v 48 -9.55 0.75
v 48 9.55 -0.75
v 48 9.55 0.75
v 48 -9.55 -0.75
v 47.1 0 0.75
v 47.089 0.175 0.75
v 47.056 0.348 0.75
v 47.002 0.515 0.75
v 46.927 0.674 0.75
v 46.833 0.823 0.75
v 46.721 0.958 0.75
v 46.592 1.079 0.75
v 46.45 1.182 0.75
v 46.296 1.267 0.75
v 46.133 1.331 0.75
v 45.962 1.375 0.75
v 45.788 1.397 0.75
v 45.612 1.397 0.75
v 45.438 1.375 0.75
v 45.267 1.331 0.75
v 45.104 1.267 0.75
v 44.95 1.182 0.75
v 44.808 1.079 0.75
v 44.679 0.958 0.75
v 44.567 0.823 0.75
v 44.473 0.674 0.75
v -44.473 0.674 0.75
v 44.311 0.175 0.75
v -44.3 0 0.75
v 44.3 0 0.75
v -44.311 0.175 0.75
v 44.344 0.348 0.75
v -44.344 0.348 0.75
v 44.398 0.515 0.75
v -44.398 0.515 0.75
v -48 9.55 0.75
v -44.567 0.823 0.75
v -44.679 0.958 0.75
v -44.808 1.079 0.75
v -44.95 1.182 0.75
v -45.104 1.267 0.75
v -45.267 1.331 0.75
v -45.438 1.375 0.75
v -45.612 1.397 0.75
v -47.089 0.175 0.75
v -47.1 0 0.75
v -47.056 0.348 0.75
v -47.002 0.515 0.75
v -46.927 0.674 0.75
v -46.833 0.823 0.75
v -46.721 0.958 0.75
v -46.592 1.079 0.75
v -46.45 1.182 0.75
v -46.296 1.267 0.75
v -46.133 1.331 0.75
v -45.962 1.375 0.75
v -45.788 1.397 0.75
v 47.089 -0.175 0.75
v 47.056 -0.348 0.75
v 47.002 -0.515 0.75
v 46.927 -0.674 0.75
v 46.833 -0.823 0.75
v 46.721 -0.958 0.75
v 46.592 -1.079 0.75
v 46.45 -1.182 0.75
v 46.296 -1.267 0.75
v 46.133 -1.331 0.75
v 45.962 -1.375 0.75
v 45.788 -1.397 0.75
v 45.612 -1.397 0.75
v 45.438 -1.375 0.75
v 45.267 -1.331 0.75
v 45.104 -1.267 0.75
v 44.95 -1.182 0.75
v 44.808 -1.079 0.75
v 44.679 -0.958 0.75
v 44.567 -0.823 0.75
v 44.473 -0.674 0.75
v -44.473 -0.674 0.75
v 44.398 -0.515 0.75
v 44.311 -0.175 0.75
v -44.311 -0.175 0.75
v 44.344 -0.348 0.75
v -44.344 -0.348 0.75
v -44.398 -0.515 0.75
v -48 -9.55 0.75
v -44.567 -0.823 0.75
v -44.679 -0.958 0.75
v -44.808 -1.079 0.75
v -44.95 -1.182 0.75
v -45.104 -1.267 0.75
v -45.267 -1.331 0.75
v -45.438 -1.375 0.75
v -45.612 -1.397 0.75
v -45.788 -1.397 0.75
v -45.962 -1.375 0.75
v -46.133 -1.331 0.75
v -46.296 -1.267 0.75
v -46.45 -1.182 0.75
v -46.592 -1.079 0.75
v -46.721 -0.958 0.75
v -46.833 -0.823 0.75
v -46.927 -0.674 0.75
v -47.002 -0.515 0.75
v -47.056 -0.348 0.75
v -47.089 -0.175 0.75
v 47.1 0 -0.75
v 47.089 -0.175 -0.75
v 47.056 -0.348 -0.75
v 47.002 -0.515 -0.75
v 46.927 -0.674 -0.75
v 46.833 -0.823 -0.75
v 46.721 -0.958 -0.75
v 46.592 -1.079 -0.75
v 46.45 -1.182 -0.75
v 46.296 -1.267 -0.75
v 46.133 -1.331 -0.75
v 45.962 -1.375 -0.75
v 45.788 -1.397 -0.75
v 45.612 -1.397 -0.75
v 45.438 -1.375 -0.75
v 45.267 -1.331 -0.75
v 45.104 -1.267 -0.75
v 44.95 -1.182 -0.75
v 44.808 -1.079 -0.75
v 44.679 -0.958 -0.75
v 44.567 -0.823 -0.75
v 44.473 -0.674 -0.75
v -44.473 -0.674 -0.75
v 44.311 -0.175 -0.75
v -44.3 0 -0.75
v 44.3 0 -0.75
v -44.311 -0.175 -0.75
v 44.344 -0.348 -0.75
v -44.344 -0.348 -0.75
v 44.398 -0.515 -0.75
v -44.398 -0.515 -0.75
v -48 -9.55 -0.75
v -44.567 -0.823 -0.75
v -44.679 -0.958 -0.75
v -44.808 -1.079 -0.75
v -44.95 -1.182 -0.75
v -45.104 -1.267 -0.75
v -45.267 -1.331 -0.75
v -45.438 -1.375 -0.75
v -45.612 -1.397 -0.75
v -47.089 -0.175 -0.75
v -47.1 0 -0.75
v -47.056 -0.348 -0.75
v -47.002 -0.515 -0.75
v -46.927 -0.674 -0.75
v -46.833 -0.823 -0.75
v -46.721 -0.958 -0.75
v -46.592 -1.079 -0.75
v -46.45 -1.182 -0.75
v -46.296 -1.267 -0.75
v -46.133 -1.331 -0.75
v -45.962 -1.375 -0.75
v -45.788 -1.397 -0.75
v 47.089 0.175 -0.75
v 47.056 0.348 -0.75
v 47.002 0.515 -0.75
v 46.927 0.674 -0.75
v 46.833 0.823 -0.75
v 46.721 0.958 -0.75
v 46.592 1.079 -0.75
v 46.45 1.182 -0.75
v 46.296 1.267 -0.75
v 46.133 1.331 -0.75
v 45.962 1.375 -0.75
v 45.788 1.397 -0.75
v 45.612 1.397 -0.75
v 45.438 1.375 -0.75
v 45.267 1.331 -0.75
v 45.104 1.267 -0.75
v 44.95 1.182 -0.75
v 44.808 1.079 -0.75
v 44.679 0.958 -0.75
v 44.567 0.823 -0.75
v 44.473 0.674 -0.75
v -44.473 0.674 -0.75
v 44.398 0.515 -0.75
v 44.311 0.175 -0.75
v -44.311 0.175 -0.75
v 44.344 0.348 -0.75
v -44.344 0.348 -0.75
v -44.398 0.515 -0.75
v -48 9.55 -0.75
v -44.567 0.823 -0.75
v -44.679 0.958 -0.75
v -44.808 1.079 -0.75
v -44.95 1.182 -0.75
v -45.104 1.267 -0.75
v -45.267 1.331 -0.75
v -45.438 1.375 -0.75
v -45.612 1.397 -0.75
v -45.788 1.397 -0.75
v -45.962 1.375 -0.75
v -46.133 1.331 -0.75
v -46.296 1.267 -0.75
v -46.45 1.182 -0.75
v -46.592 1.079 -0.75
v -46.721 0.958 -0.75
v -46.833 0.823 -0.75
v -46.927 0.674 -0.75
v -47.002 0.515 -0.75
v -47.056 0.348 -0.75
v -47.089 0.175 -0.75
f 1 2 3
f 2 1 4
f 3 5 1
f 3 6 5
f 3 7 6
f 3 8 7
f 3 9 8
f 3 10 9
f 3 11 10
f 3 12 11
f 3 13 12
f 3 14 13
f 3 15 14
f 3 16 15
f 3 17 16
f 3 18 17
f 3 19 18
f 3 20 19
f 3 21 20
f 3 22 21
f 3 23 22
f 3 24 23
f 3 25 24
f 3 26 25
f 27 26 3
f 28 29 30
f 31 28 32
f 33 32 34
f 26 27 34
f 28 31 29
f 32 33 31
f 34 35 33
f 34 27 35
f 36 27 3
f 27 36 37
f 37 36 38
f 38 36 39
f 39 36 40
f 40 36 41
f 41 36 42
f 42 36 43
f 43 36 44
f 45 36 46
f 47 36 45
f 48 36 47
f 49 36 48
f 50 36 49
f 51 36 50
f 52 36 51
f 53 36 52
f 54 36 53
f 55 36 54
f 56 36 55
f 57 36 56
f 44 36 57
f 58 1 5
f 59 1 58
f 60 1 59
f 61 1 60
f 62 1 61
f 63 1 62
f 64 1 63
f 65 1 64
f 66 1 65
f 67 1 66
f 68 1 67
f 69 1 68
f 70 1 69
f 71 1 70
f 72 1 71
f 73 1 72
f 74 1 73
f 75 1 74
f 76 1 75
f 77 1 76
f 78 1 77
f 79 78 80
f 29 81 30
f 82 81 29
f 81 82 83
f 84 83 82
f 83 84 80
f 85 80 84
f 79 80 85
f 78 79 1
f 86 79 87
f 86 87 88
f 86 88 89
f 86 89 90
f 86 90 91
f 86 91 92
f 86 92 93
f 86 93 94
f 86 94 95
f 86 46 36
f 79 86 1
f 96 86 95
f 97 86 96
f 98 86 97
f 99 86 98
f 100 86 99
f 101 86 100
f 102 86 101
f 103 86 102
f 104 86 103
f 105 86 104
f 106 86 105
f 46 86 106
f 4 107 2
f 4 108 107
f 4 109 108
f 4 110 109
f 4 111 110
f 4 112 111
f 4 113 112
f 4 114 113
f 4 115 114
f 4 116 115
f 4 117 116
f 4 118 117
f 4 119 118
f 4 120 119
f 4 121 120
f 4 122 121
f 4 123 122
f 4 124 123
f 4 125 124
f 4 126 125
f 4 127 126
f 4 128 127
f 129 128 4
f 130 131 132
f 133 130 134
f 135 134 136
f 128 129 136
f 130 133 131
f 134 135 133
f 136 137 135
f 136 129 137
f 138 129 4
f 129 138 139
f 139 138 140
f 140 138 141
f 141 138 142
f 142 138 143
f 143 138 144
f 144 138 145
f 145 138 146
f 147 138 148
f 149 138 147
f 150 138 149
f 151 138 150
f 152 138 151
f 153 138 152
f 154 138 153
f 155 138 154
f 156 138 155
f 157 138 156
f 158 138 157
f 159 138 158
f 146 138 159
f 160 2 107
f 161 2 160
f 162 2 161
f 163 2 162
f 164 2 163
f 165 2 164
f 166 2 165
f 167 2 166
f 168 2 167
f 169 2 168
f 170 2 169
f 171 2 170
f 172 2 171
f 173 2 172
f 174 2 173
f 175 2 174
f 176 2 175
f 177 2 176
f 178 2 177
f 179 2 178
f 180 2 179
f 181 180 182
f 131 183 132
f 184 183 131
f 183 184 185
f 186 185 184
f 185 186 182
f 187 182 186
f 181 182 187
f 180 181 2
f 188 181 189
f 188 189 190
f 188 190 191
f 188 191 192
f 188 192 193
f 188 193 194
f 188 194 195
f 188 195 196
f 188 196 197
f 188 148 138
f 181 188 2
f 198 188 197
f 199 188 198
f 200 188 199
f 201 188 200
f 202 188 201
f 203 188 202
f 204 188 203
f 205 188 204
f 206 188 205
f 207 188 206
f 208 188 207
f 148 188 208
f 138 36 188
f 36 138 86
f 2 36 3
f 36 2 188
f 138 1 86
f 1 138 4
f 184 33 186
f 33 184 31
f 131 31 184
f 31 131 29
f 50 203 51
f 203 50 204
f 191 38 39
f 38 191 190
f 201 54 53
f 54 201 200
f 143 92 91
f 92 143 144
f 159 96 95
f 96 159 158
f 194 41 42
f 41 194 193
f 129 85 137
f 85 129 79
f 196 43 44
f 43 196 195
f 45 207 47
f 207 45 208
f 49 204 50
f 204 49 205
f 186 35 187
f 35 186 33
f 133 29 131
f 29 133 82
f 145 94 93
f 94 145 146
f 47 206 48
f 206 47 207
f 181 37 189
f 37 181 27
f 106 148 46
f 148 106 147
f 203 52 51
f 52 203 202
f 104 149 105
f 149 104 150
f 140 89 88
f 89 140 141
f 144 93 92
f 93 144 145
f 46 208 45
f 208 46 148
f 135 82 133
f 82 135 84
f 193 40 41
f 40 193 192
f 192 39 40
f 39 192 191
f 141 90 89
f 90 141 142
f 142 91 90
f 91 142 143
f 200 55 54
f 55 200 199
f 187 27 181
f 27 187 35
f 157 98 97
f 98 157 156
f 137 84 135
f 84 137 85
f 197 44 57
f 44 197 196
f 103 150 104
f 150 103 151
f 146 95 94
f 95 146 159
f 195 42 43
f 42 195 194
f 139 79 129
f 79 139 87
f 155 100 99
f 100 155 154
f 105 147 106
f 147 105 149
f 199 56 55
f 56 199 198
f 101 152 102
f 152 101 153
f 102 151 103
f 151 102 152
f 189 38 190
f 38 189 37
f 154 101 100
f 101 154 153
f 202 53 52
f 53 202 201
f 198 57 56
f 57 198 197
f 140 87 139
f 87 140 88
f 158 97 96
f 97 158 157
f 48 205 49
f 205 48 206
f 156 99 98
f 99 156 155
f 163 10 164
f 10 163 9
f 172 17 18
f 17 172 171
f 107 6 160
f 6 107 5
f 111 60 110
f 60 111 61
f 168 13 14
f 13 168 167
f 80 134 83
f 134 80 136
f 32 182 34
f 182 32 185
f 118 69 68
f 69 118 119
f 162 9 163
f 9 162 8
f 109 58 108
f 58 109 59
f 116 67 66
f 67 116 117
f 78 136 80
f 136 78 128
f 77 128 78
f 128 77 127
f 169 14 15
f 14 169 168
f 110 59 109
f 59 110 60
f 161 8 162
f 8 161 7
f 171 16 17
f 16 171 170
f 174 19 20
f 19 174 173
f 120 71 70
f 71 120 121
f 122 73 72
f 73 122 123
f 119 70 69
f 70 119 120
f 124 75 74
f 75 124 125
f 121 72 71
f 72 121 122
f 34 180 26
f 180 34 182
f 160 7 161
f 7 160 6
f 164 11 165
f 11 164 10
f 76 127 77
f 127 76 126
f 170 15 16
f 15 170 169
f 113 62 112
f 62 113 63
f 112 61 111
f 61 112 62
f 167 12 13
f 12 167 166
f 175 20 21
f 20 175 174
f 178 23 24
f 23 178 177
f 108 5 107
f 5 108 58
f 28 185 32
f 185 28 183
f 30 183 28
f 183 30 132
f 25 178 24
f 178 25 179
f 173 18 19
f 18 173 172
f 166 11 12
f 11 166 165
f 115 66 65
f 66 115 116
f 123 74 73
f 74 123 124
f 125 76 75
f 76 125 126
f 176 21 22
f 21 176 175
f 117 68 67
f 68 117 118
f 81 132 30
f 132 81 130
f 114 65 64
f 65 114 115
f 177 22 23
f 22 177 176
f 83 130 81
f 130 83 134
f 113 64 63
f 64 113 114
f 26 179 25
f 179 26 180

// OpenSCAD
// file: ../robot_settings.scad
main_box_x = 95; // 96
main_box_y = 102;
main_box_z = 74; // 74.5
wall_thickness = 2;

rail_gap = 2;
rail_inset = 7;

rail_thickness = 7;
rail_length = 250;
rail_width = 200;

raspberry_pi_screw_seperation_y = 57;
raspberry_pi_screw_seperation_z = 48;
raspberry_pi_peg_h = 8;

gears_module = 1;
pinion_gear_teeth = 30;
pinion_gear_width = 5;
pinion_gear_bore = 4;

gears_setback_distance = 25;
gear_post_height = 2 * pinion_gear_width + rail_thickness + 8 ;

steering_motor_mount_x = 45;
steering_motor_mount_y = 36;
steering_motor_mount_z = 18;
steering_motor_mount_setback_distance = gears_setback_distance + 16;

dc_motor_housing_minus_encoder_z = 48;
dc_motor_encoder_z = 9.33;
dc_motor_encoder_wheel_d = 13.4;
dc_motor_encoder_wheel_thickness = 5;
dc_motor_encoder_wheel_gap = 3;
dc_motor_encoder_circuit_thickness = 2;
dc_motor_cutout_d = 24.8;
dc_motor_cutout_z = 19.5;

dc_motor_screw_head_z = 2;
dc_motor_screw_head_d = 5.6;
dc_motor_screw_d = 3.2;
dc_motor_screw_offset = 8.5;

dc_motor_axle_ring_z = 3;
dc_motor_axle_ring_d = 7.2;
dc_motor_axle_cutout_d = 4.5;
dc_motor_axle_cutout_z = 10;
dc_motor_axle_notch_cutout = 0.5;
dc_motor_axle_notch_cutout_z = 6;

drv8871_x = 20.3;
drv8871_y = 24;
drv8871_z = 2;
drv8871_screw_d = 2.5;
drv8871_screw_distance = 15.64;
drv8871_solder_points_z = 2;
drv8871_solder_points_d = 1.66;
drv8871_solder_offset_y = 4.4;
drv8871_solder_inner_points_distance = 5;
drv8871_solder_outer_points_distance = 12;

drv8871mount_edge_x = 1.5;
drv8871mount_edge_wall = 3;
drv8871mount_z = 5;
drv8871mount_x = drv8871_x +  drv8871mount_edge_wall - 2* drv8871mount_edge_x;
drv8871mount_y = 19;

steering_shaft_z = gear_post_height + dc_motor_axle_ring_z + pinion_gear_width + 15;
steering_shaft_d = 7;
steering_shaft_motor_fitting_d = 9;

lidar_mount_y = 125;
lidar_mount_x = 65;

ball_bearing_height = 7;
ball_bearing_outer_diameter = 22;
ball_bearing_inner_diameter = 8;

pull_bar_radius = 3.3;

rack_module = 1;
rack_length = main_box_x / 2;
rack_height = 10;
rack_width = 10;
rack_teeth = 30;
rack_bore = 3;

// tire hardware
axle_reciever_inner_diameter = 7.75;
axle_reciever_length = 18.8;
axle_notch_length = 7;
axle_notch_cutout = 2.4;

// power distribution bar
power_bar_x = 96;
power_bar_y = 19.1;
power_bar_z = 1.5;
power_bar_screw_distance = 91.4;
power_bar_screw_d = 2.8;
power_bar_standoff_z = 5;
power_bar_standoff_d = 6.83;
// main file
include <../robot_settings.scad>
$fn = 50;

module power_bar() {
  difference() {
    cube([power_bar_x, power_bar_y, power_bar_z], center = true);
    
    translate([-power_bar_screw_distance / 2, 0, 0])
    cylinder(h = 10, d = power_bar_screw_d, center = true);
    
    translate([power_bar_screw_distance / 2, 0, 0])
    cylinder(h = 10, d = power_bar_screw_d, center = true);
  }
}

power_bar();
